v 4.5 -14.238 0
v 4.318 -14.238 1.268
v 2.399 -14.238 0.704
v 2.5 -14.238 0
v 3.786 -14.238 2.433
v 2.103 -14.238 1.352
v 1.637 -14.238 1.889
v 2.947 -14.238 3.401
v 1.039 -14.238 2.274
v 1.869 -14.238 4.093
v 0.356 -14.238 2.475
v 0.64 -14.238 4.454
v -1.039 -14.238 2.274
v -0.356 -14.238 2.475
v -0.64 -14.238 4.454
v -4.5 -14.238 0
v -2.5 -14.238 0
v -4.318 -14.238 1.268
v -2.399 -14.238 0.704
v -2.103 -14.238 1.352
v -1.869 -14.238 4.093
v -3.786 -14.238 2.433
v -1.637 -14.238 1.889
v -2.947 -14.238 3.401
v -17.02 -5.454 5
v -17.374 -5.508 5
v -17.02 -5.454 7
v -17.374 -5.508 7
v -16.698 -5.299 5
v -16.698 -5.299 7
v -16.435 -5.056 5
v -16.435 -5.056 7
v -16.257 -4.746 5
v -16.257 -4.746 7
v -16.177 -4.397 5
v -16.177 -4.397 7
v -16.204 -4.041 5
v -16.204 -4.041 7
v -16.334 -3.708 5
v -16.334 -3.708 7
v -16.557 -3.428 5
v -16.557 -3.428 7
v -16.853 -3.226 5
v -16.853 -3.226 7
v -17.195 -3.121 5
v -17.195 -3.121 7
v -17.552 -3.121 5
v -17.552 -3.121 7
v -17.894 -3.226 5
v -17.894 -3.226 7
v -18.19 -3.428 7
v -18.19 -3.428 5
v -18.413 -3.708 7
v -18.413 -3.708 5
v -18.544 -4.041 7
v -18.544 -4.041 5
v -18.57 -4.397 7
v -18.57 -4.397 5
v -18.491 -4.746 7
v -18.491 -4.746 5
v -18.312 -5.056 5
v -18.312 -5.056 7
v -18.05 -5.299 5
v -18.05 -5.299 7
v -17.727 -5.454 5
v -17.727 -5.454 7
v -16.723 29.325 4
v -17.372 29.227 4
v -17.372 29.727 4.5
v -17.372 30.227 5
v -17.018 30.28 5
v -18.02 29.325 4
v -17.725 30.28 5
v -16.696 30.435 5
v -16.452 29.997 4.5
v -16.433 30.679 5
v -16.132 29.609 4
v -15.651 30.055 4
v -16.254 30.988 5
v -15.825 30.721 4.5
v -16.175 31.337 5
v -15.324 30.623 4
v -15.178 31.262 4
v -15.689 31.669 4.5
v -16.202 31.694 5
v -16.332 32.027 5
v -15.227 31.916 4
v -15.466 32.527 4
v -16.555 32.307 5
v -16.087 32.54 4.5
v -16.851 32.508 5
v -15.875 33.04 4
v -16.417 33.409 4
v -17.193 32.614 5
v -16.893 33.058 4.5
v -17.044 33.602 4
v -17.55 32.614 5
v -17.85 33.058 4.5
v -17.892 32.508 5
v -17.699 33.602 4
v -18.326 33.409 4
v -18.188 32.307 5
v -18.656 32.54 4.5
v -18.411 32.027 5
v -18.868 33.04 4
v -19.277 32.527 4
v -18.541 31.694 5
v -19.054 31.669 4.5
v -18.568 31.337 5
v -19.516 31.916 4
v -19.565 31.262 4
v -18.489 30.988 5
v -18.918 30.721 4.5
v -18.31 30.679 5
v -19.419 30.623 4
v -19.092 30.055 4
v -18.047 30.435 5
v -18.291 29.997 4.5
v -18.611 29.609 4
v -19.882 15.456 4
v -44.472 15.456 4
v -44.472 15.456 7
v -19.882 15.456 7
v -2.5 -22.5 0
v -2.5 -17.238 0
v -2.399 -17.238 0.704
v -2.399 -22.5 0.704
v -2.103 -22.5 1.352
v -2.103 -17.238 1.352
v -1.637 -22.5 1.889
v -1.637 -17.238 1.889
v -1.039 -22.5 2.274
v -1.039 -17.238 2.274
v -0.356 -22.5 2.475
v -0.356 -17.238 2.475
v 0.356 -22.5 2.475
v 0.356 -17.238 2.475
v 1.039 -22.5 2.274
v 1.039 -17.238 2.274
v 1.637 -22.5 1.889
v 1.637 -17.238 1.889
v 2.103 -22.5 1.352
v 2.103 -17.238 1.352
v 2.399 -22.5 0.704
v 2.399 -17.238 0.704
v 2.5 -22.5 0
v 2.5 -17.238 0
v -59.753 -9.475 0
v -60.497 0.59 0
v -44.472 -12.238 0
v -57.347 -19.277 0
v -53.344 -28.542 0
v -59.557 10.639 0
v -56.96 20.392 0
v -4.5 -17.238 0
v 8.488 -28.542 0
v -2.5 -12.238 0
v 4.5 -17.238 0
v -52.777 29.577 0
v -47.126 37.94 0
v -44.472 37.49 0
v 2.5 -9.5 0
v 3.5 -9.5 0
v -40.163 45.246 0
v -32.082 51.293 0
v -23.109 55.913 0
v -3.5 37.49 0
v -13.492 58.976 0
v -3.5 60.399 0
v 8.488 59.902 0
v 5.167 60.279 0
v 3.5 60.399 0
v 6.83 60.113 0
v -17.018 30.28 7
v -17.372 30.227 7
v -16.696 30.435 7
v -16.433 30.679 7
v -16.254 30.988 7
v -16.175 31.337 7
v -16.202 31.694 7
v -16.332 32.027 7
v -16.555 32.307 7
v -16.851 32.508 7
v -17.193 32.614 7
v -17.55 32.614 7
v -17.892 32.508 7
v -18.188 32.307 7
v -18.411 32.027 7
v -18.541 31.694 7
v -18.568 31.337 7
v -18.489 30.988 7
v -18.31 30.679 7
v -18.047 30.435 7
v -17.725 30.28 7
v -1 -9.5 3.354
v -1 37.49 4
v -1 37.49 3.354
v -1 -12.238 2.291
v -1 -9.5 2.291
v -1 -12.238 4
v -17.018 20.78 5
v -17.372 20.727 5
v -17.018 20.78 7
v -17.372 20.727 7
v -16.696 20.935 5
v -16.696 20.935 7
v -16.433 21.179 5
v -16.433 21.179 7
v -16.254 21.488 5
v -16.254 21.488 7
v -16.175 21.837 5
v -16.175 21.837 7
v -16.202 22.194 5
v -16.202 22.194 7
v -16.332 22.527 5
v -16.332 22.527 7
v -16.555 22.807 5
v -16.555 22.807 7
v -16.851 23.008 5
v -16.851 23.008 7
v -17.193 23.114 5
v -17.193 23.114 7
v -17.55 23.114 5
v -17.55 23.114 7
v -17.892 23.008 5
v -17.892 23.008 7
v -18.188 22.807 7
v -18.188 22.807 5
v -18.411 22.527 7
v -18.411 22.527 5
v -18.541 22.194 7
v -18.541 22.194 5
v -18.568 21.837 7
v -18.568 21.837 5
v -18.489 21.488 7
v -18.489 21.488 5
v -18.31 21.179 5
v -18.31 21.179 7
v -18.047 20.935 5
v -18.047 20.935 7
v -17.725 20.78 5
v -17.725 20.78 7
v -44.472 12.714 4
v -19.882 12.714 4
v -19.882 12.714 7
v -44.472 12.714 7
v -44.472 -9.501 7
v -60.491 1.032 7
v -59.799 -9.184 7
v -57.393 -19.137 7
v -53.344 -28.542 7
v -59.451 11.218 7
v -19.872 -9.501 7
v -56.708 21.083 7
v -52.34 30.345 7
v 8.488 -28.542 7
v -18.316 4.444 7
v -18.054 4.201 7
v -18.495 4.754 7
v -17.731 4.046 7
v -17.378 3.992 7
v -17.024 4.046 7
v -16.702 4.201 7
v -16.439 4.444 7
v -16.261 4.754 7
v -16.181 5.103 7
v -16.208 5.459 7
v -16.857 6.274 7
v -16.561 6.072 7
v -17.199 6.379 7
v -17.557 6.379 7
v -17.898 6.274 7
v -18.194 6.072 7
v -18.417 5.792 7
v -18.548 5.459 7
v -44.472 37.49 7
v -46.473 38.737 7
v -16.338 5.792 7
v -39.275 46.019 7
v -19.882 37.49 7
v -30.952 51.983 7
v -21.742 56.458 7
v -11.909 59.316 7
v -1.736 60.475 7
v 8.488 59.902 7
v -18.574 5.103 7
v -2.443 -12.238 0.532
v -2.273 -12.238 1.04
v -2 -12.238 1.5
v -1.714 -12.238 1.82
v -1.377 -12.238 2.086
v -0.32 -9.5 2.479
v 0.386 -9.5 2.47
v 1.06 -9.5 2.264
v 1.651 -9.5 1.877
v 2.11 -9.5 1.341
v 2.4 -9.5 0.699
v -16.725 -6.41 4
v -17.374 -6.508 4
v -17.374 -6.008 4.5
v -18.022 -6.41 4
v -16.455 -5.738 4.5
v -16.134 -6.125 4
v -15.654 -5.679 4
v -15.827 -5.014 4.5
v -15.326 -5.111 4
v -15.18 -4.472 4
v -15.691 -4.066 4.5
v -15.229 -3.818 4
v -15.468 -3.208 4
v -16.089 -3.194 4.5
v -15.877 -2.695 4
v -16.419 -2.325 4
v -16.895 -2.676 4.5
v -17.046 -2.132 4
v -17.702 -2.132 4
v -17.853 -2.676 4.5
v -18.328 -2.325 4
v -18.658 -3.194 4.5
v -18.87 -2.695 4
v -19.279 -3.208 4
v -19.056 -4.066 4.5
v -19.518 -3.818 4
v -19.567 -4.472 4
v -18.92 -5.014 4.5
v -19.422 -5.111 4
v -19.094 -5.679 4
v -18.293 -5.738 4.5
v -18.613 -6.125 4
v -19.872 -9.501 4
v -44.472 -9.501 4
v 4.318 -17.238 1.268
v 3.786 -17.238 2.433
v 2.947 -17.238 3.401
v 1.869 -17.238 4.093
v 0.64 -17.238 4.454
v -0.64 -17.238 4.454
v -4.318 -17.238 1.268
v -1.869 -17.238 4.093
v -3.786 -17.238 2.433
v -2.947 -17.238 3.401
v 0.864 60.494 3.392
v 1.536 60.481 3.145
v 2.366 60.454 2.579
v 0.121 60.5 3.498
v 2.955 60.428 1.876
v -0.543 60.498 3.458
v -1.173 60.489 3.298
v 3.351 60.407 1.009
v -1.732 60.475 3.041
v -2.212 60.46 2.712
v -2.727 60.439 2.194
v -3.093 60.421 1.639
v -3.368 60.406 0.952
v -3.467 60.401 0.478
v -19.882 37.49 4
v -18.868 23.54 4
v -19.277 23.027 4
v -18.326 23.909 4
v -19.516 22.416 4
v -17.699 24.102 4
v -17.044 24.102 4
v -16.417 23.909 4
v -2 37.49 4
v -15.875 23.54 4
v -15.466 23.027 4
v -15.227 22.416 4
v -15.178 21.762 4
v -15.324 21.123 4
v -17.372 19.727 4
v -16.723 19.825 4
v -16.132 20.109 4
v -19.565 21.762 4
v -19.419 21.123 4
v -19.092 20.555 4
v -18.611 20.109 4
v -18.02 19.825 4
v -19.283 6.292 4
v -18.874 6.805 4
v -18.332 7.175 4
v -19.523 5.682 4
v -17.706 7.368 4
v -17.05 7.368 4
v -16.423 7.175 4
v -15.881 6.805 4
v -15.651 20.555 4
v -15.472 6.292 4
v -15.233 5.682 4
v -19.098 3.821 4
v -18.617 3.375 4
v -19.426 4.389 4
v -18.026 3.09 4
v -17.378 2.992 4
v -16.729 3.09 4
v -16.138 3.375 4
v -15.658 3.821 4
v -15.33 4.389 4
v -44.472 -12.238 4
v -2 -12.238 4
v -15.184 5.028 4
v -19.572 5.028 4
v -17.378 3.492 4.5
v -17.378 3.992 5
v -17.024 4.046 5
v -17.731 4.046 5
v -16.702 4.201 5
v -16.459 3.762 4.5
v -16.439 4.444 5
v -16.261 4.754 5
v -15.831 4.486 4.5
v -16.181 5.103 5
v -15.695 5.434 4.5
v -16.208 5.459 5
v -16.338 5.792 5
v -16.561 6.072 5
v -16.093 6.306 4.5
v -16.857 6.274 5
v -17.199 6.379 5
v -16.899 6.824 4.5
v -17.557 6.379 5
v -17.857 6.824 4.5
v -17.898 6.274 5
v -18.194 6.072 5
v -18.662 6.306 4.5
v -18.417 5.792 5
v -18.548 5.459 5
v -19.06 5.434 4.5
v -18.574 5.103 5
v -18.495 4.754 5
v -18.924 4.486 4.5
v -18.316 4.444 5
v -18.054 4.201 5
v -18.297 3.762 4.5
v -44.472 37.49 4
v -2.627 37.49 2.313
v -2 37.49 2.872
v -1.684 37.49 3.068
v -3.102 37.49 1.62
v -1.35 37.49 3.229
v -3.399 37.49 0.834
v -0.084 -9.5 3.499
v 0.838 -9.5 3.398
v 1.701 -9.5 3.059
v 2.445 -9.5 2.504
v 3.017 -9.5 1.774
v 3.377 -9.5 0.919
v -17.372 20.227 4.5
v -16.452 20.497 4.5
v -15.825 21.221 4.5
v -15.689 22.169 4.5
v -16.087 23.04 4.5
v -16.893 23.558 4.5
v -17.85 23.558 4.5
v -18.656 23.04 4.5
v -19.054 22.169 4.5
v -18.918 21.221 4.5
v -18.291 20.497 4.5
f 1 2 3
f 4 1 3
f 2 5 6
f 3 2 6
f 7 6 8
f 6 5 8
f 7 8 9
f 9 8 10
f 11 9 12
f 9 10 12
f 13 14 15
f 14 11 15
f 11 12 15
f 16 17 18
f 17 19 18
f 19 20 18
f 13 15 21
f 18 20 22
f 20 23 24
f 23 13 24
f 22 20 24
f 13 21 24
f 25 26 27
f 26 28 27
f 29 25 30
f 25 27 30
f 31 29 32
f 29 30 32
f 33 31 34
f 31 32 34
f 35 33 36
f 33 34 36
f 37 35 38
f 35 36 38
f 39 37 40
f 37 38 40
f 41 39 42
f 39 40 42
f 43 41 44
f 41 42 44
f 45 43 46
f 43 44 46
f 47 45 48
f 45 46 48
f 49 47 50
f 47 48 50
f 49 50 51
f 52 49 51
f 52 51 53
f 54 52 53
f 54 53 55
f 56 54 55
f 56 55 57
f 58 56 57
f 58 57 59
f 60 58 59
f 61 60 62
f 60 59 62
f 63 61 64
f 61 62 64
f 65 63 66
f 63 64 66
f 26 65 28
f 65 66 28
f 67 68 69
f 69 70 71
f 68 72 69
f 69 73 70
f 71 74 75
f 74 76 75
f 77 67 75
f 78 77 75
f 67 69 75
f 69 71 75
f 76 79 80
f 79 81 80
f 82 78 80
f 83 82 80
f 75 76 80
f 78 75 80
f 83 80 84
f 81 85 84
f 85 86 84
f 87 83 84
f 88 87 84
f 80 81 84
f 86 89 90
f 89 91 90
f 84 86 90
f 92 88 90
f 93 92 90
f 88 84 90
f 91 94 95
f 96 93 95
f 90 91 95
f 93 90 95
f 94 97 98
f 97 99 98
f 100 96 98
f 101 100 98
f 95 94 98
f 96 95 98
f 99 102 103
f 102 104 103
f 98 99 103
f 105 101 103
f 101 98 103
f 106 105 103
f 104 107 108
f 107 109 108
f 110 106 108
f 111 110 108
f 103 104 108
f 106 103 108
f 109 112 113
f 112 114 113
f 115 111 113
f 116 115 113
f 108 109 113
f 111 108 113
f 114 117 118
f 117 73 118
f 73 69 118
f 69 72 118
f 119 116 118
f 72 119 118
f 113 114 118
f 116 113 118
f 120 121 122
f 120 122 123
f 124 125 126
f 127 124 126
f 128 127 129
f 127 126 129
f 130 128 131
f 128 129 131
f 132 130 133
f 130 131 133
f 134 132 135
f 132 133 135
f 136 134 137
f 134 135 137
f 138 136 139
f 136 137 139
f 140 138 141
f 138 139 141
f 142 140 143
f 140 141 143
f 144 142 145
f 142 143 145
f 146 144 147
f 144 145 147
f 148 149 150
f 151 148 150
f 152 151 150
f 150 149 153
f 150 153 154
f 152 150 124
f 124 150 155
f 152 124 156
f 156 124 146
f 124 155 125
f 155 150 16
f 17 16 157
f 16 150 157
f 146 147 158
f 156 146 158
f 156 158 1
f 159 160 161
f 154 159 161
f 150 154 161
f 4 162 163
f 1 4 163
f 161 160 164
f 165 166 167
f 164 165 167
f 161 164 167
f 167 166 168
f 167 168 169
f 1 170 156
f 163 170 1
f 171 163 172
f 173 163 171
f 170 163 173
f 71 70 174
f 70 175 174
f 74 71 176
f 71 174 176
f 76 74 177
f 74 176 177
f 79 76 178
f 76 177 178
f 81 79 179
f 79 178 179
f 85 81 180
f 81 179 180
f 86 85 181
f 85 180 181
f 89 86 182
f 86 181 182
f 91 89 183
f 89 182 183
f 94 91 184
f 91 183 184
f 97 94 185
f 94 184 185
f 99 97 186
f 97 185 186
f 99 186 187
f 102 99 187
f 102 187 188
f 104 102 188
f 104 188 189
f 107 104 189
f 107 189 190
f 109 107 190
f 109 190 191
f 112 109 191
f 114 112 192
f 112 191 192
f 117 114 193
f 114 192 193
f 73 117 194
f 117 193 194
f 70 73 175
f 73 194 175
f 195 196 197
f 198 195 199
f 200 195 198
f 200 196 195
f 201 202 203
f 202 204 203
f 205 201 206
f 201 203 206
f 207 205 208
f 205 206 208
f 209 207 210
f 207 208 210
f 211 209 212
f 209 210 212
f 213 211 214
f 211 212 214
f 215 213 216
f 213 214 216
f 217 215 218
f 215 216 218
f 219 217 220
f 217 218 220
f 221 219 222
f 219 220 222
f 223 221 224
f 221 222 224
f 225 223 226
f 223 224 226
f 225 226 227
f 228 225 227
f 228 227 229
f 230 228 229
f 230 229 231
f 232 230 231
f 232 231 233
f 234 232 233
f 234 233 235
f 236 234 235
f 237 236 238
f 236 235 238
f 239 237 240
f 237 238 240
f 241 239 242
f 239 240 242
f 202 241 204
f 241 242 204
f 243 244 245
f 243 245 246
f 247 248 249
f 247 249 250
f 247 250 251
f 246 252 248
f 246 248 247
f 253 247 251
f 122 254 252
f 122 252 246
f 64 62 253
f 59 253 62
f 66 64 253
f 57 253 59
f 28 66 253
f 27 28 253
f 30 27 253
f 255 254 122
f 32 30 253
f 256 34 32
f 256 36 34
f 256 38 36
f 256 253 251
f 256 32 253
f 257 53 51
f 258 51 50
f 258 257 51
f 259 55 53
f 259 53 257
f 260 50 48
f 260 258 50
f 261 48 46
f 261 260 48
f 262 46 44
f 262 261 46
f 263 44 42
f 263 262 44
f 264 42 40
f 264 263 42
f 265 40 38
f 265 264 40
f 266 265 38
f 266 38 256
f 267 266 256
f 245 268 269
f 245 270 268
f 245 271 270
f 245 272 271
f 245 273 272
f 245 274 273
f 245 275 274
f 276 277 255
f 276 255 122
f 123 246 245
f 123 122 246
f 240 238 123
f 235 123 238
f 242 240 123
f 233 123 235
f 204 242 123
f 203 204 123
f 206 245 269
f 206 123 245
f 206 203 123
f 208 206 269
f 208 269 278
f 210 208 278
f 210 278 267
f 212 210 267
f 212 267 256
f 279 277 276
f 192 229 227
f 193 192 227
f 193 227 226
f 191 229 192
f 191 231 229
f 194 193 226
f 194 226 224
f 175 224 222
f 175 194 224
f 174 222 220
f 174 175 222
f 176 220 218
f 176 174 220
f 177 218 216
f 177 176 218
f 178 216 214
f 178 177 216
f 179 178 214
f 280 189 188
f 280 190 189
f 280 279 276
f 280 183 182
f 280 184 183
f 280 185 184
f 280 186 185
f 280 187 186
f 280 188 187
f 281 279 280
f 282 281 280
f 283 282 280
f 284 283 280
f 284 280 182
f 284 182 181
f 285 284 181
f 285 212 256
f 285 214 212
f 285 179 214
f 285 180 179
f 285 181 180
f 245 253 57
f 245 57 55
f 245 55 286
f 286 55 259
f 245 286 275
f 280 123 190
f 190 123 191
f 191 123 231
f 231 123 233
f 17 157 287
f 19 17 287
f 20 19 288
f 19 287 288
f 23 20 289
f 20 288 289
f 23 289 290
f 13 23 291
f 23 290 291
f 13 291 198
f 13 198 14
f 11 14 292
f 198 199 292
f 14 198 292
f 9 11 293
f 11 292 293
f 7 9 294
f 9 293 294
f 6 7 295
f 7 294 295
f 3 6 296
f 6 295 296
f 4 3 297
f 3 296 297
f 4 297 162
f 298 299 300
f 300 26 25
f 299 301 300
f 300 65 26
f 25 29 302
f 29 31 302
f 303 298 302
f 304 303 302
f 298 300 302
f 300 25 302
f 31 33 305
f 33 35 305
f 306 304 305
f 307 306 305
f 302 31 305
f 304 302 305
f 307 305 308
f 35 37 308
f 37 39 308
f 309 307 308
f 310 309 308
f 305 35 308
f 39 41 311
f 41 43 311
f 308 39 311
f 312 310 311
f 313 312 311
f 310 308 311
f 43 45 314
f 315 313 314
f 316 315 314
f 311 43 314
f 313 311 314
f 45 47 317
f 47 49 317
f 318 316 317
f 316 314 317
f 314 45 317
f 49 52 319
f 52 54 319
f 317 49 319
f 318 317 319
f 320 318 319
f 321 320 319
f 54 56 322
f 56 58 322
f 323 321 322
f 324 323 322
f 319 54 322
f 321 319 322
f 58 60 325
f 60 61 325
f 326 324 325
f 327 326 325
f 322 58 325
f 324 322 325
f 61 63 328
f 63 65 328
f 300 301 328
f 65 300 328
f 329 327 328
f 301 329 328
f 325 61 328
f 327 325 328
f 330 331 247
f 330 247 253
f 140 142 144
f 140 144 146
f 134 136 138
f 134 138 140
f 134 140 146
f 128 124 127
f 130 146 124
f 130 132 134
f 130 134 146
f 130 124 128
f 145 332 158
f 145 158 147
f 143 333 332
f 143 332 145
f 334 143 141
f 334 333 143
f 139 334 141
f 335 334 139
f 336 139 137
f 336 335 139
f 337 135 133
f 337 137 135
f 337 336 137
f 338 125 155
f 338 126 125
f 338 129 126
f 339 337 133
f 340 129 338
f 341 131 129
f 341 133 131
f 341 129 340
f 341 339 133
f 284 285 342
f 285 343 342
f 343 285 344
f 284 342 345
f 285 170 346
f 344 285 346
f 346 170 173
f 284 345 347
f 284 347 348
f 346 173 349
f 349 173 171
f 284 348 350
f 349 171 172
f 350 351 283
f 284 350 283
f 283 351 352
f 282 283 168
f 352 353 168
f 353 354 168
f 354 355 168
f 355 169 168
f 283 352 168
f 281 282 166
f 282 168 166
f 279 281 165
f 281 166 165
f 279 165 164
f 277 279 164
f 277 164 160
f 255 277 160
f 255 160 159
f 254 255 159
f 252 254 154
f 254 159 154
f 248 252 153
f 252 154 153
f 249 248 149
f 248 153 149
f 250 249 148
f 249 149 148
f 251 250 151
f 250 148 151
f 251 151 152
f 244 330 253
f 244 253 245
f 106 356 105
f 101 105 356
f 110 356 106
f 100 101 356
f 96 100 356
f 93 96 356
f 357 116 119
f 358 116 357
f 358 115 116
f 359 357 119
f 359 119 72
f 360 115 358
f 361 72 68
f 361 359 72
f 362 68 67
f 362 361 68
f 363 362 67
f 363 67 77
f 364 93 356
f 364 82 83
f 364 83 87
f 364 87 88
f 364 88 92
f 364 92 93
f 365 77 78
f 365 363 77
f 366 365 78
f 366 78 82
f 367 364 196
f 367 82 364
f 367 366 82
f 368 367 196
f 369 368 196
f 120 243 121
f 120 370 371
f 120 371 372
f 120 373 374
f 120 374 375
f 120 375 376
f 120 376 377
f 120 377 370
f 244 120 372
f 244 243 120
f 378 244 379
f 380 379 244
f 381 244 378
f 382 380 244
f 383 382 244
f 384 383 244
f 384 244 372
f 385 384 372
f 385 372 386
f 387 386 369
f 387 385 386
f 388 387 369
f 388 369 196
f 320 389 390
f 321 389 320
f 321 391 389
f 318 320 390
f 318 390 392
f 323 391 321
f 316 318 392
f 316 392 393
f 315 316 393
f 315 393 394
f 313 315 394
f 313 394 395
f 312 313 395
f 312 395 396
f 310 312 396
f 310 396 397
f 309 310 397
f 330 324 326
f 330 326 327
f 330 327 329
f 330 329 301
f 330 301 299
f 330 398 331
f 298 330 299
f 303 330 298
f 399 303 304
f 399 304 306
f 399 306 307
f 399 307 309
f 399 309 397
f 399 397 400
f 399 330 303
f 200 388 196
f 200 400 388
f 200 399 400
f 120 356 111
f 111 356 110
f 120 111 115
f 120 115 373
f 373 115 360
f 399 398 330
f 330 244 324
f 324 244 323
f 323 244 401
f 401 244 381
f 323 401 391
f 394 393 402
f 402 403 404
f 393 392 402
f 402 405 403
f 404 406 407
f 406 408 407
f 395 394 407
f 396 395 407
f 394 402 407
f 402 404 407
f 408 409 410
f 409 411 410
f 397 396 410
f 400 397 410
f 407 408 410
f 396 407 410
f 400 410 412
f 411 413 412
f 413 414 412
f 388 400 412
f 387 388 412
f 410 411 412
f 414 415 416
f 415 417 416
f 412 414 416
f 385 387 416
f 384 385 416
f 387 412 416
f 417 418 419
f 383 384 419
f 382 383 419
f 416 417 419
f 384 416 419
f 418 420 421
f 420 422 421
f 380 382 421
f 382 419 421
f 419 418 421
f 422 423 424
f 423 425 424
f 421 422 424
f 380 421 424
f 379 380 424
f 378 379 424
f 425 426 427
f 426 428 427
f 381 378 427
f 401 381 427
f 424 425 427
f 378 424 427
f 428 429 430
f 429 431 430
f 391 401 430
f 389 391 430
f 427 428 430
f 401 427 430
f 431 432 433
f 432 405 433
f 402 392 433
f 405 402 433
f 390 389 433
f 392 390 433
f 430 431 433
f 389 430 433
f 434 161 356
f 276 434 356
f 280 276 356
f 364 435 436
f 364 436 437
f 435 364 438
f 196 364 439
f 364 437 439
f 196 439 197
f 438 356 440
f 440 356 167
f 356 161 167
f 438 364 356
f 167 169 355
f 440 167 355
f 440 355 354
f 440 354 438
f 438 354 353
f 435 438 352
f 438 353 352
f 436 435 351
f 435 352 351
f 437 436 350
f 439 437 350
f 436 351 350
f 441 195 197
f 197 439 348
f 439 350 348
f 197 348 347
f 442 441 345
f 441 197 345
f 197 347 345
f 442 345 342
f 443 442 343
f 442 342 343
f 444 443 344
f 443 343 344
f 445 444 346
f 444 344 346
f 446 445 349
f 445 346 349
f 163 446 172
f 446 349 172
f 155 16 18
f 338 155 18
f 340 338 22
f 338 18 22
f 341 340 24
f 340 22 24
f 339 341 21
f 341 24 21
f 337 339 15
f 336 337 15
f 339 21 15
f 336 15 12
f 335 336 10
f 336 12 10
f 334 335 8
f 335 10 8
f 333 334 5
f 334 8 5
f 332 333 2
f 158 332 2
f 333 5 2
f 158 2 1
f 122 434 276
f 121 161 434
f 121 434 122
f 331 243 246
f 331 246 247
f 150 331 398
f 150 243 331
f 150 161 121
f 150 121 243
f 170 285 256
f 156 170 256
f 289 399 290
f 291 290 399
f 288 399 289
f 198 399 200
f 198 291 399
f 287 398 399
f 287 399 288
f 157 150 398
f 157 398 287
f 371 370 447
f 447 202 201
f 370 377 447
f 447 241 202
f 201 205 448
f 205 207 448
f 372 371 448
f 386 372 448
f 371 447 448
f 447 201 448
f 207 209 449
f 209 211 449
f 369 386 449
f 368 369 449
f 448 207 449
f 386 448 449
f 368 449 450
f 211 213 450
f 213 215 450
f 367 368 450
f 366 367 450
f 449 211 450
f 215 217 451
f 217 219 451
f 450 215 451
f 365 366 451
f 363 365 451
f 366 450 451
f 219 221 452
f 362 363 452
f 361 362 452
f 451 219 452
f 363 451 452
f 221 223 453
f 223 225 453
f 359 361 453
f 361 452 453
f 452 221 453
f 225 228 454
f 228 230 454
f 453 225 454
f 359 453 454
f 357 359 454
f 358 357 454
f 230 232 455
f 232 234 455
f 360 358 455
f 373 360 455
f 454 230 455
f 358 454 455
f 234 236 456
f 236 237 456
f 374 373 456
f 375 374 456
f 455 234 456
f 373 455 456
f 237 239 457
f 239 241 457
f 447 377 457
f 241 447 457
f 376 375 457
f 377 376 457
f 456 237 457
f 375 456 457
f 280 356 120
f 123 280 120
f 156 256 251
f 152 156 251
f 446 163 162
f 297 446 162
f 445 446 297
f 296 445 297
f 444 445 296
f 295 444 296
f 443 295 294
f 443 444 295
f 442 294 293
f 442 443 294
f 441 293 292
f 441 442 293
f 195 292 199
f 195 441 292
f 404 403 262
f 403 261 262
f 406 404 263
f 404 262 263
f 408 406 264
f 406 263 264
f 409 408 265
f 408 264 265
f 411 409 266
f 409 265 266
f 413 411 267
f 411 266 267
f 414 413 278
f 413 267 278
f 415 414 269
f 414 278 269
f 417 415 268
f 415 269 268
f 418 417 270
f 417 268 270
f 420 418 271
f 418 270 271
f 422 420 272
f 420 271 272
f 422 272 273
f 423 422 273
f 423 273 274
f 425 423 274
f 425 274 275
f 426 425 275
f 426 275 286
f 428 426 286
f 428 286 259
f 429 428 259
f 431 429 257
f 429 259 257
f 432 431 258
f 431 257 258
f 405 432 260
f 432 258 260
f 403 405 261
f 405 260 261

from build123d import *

# Parameters (mm, degrees)
SKETCH1_R                                       = 60.5
BOSS_EXTRUDE1_DEPTH                             = 7
SKETCH6_R                                       = 3.5
CUT_EXTRUDE2_DEPTH                              = 70
CUT_EXTRUDE7_DEPTH                              = 10
SKETCH23_W                                      = 42.472377856
SKETCH23_H                                      = 49.728625228
CUT_EXTRUDE8_DEPTH                              = 4
SKETCH24_W                                      = 49.728625228
SKETCH24_H                                      = 1.127718677
CUT_EXTRUDE10_DEPTH                             = 1
CSK_FOR_M2_FLAT_HEAD_MACHINE_SCREW1_D           = 2.4
CSK_FOR_M2_FLAT_HEAD_MACHINE_SCREW1_CSINK_D     = 4.4
CSK_FOR_M2_FLAT_HEAD_MACHINE_SCREW1_CSINK_ANGLE = 90
SKETCH30_W                                      = 24.590301857
SKETCH30_H                                      = 22.033921334
CUT_EXTRUDE11_DEPTH                             = 10
SKETCH39_R                                      = 2.5
CUT_EXTRUDE14_DEPTH                             = 13
SKETCH42_R                                      = 4.5
CUT_EXTRUDE15_DEPTH                             = 1.5
SKETCH43_W                                      = 2.738349456
SKETCH43_H                                      = 1.372281323
CUT_EXTRUDE17_DEPTH                             = 1


with BuildPart() as part:
    # Sketch1 → Boss-Extrude1 (new body)
    with BuildSketch(Plane(origin=(0, 0, 0), x_dir=(0, 1, 0), z_dir=(0, 0, 1))):
        Circle(SKETCH1_R)
    extrude(amount=BOSS_EXTRUDE1_DEPTH)

    # Sketch6 → Cut-Extrude2 (cut)
    with BuildSketch(Plane(origin=(0, 60.5, -6), x_dir=(-1, 0, 0), z_dir=(0, 1, 0))):
        with Locations((0, 6)):
            Circle(SKETCH6_R)
    extrude(amount=-CUT_EXTRUDE2_DEPTH, mode=Mode.SUBTRACT)

    # Sketch21 → Cut-Extrude7 (cut)
    with BuildSketch(Plane.XY.offset(7)):
        with BuildLine():
            Line((8.487846034, 59.901639958), (8.487846034, -28.542105861))
            Line((8.487846034, -28.542105861), (-53.344148629, -28.542105861))
            ThreePointArc((-53.344148629, -28.542105861), (113.000185213, -78.999671309), (8.487846034, 59.901639958))
        make_face()
    extrude(amount=-CUT_EXTRUDE7_DEPTH, mode=Mode.SUBTRACT)

    # Sketch23 → Cut-Extrude8 (cut)
    with BuildSketch(Plane(origin=(0, 0, 0), x_dir=(1, 0, 0), z_dir=(0, 0, -1))):
        with Locations((-23.236188928, -12.625963158)):
            Rectangle(SKETCH23_W, SKETCH23_H)
    extrude(amount=-CUT_EXTRUDE8_DEPTH, mode=Mode.SUBTRACT)

    # Sketch24 → Cut-Extrude10 (cut)
    with BuildSketch(Plane(origin=(-2, 0, 0), x_dir=(0, -1, 0), z_dir=(-1, 0, 0))):
        with Locations((-12.625963158, 3.436140662)):
            Rectangle(SKETCH24_W, SKETCH24_H)
    extrude(amount=-CUT_EXTRUDE10_DEPTH, mode=Mode.SUBTRACT)

    # CSK for M2 Flat Head Machine Screw1 (through all)
    with Locations(Plane.YX.offset(-4)):
        with Locations((-4.307531, -17.373644116), (5.192468135, -17.377696999), (21.926905074, -17.371512218), (31.426905074, -17.371512218)):
            CounterSinkHole(CSK_FOR_M2_FLAT_HEAD_MACHINE_SCREW1_D / 2, CSK_FOR_M2_FLAT_HEAD_MACHINE_SCREW1_CSINK_D / 2, counter_sink_angle=CSK_FOR_M2_FLAT_HEAD_MACHINE_SCREW1_CSINK_ANGLE)

    # Sketch30 → Cut-Extrude11 (cut)
    with BuildSketch(Plane(origin=(0, 0, 4), x_dir=(1, 0, 0), z_dir=(0, 0, -1))):
        with Locations((-32.177226928, -26.473315105)):
            Rectangle(SKETCH30_W, SKETCH30_H)
        Polygon((-19.882075999, -12.713705866), (-44.472377856, -12.713705866), (-44.472377856, 9.50080752), (-19.871510792, 9.50080752), align=None)
    extrude(amount=-CUT_EXTRUDE11_DEPTH, mode=Mode.SUBTRACT)

    # Sketch39 → Cut-Extrude14 (cut)
    with BuildSketch(Plane(origin=(0, -9.5, 0), x_dir=(-1, 0, 0), z_dir=(0, 1, 0))):
        Circle(SKETCH39_R)
    extrude(amount=-CUT_EXTRUDE14_DEPTH, mode=Mode.SUBTRACT)

    # Sketch42 → Cut-Extrude15 (cut, symmetric)
    with BuildSketch(Plane(origin=(0, -15.738349456, 0), x_dir=(-1, 0, 0), z_dir=(0, 1, 0))):
        Circle(SKETCH42_R)
    extrude(amount=CUT_EXTRUDE15_DEPTH, both=True, mode=Mode.SUBTRACT)

    # Sketch43 → Cut-Extrude17 (cut)
    with BuildSketch(Plane(origin=(-2, 0, 0), x_dir=(0, -1, 0), z_dir=(-1, 0, 0))):
        with Locations((10.869174728, 2.186140662)):
            Rectangle(SKETCH43_W, SKETCH43_H)
    extrude(amount=-CUT_EXTRUDE17_DEPTH, mode=Mode.SUBTRACT)


solid = part.part
